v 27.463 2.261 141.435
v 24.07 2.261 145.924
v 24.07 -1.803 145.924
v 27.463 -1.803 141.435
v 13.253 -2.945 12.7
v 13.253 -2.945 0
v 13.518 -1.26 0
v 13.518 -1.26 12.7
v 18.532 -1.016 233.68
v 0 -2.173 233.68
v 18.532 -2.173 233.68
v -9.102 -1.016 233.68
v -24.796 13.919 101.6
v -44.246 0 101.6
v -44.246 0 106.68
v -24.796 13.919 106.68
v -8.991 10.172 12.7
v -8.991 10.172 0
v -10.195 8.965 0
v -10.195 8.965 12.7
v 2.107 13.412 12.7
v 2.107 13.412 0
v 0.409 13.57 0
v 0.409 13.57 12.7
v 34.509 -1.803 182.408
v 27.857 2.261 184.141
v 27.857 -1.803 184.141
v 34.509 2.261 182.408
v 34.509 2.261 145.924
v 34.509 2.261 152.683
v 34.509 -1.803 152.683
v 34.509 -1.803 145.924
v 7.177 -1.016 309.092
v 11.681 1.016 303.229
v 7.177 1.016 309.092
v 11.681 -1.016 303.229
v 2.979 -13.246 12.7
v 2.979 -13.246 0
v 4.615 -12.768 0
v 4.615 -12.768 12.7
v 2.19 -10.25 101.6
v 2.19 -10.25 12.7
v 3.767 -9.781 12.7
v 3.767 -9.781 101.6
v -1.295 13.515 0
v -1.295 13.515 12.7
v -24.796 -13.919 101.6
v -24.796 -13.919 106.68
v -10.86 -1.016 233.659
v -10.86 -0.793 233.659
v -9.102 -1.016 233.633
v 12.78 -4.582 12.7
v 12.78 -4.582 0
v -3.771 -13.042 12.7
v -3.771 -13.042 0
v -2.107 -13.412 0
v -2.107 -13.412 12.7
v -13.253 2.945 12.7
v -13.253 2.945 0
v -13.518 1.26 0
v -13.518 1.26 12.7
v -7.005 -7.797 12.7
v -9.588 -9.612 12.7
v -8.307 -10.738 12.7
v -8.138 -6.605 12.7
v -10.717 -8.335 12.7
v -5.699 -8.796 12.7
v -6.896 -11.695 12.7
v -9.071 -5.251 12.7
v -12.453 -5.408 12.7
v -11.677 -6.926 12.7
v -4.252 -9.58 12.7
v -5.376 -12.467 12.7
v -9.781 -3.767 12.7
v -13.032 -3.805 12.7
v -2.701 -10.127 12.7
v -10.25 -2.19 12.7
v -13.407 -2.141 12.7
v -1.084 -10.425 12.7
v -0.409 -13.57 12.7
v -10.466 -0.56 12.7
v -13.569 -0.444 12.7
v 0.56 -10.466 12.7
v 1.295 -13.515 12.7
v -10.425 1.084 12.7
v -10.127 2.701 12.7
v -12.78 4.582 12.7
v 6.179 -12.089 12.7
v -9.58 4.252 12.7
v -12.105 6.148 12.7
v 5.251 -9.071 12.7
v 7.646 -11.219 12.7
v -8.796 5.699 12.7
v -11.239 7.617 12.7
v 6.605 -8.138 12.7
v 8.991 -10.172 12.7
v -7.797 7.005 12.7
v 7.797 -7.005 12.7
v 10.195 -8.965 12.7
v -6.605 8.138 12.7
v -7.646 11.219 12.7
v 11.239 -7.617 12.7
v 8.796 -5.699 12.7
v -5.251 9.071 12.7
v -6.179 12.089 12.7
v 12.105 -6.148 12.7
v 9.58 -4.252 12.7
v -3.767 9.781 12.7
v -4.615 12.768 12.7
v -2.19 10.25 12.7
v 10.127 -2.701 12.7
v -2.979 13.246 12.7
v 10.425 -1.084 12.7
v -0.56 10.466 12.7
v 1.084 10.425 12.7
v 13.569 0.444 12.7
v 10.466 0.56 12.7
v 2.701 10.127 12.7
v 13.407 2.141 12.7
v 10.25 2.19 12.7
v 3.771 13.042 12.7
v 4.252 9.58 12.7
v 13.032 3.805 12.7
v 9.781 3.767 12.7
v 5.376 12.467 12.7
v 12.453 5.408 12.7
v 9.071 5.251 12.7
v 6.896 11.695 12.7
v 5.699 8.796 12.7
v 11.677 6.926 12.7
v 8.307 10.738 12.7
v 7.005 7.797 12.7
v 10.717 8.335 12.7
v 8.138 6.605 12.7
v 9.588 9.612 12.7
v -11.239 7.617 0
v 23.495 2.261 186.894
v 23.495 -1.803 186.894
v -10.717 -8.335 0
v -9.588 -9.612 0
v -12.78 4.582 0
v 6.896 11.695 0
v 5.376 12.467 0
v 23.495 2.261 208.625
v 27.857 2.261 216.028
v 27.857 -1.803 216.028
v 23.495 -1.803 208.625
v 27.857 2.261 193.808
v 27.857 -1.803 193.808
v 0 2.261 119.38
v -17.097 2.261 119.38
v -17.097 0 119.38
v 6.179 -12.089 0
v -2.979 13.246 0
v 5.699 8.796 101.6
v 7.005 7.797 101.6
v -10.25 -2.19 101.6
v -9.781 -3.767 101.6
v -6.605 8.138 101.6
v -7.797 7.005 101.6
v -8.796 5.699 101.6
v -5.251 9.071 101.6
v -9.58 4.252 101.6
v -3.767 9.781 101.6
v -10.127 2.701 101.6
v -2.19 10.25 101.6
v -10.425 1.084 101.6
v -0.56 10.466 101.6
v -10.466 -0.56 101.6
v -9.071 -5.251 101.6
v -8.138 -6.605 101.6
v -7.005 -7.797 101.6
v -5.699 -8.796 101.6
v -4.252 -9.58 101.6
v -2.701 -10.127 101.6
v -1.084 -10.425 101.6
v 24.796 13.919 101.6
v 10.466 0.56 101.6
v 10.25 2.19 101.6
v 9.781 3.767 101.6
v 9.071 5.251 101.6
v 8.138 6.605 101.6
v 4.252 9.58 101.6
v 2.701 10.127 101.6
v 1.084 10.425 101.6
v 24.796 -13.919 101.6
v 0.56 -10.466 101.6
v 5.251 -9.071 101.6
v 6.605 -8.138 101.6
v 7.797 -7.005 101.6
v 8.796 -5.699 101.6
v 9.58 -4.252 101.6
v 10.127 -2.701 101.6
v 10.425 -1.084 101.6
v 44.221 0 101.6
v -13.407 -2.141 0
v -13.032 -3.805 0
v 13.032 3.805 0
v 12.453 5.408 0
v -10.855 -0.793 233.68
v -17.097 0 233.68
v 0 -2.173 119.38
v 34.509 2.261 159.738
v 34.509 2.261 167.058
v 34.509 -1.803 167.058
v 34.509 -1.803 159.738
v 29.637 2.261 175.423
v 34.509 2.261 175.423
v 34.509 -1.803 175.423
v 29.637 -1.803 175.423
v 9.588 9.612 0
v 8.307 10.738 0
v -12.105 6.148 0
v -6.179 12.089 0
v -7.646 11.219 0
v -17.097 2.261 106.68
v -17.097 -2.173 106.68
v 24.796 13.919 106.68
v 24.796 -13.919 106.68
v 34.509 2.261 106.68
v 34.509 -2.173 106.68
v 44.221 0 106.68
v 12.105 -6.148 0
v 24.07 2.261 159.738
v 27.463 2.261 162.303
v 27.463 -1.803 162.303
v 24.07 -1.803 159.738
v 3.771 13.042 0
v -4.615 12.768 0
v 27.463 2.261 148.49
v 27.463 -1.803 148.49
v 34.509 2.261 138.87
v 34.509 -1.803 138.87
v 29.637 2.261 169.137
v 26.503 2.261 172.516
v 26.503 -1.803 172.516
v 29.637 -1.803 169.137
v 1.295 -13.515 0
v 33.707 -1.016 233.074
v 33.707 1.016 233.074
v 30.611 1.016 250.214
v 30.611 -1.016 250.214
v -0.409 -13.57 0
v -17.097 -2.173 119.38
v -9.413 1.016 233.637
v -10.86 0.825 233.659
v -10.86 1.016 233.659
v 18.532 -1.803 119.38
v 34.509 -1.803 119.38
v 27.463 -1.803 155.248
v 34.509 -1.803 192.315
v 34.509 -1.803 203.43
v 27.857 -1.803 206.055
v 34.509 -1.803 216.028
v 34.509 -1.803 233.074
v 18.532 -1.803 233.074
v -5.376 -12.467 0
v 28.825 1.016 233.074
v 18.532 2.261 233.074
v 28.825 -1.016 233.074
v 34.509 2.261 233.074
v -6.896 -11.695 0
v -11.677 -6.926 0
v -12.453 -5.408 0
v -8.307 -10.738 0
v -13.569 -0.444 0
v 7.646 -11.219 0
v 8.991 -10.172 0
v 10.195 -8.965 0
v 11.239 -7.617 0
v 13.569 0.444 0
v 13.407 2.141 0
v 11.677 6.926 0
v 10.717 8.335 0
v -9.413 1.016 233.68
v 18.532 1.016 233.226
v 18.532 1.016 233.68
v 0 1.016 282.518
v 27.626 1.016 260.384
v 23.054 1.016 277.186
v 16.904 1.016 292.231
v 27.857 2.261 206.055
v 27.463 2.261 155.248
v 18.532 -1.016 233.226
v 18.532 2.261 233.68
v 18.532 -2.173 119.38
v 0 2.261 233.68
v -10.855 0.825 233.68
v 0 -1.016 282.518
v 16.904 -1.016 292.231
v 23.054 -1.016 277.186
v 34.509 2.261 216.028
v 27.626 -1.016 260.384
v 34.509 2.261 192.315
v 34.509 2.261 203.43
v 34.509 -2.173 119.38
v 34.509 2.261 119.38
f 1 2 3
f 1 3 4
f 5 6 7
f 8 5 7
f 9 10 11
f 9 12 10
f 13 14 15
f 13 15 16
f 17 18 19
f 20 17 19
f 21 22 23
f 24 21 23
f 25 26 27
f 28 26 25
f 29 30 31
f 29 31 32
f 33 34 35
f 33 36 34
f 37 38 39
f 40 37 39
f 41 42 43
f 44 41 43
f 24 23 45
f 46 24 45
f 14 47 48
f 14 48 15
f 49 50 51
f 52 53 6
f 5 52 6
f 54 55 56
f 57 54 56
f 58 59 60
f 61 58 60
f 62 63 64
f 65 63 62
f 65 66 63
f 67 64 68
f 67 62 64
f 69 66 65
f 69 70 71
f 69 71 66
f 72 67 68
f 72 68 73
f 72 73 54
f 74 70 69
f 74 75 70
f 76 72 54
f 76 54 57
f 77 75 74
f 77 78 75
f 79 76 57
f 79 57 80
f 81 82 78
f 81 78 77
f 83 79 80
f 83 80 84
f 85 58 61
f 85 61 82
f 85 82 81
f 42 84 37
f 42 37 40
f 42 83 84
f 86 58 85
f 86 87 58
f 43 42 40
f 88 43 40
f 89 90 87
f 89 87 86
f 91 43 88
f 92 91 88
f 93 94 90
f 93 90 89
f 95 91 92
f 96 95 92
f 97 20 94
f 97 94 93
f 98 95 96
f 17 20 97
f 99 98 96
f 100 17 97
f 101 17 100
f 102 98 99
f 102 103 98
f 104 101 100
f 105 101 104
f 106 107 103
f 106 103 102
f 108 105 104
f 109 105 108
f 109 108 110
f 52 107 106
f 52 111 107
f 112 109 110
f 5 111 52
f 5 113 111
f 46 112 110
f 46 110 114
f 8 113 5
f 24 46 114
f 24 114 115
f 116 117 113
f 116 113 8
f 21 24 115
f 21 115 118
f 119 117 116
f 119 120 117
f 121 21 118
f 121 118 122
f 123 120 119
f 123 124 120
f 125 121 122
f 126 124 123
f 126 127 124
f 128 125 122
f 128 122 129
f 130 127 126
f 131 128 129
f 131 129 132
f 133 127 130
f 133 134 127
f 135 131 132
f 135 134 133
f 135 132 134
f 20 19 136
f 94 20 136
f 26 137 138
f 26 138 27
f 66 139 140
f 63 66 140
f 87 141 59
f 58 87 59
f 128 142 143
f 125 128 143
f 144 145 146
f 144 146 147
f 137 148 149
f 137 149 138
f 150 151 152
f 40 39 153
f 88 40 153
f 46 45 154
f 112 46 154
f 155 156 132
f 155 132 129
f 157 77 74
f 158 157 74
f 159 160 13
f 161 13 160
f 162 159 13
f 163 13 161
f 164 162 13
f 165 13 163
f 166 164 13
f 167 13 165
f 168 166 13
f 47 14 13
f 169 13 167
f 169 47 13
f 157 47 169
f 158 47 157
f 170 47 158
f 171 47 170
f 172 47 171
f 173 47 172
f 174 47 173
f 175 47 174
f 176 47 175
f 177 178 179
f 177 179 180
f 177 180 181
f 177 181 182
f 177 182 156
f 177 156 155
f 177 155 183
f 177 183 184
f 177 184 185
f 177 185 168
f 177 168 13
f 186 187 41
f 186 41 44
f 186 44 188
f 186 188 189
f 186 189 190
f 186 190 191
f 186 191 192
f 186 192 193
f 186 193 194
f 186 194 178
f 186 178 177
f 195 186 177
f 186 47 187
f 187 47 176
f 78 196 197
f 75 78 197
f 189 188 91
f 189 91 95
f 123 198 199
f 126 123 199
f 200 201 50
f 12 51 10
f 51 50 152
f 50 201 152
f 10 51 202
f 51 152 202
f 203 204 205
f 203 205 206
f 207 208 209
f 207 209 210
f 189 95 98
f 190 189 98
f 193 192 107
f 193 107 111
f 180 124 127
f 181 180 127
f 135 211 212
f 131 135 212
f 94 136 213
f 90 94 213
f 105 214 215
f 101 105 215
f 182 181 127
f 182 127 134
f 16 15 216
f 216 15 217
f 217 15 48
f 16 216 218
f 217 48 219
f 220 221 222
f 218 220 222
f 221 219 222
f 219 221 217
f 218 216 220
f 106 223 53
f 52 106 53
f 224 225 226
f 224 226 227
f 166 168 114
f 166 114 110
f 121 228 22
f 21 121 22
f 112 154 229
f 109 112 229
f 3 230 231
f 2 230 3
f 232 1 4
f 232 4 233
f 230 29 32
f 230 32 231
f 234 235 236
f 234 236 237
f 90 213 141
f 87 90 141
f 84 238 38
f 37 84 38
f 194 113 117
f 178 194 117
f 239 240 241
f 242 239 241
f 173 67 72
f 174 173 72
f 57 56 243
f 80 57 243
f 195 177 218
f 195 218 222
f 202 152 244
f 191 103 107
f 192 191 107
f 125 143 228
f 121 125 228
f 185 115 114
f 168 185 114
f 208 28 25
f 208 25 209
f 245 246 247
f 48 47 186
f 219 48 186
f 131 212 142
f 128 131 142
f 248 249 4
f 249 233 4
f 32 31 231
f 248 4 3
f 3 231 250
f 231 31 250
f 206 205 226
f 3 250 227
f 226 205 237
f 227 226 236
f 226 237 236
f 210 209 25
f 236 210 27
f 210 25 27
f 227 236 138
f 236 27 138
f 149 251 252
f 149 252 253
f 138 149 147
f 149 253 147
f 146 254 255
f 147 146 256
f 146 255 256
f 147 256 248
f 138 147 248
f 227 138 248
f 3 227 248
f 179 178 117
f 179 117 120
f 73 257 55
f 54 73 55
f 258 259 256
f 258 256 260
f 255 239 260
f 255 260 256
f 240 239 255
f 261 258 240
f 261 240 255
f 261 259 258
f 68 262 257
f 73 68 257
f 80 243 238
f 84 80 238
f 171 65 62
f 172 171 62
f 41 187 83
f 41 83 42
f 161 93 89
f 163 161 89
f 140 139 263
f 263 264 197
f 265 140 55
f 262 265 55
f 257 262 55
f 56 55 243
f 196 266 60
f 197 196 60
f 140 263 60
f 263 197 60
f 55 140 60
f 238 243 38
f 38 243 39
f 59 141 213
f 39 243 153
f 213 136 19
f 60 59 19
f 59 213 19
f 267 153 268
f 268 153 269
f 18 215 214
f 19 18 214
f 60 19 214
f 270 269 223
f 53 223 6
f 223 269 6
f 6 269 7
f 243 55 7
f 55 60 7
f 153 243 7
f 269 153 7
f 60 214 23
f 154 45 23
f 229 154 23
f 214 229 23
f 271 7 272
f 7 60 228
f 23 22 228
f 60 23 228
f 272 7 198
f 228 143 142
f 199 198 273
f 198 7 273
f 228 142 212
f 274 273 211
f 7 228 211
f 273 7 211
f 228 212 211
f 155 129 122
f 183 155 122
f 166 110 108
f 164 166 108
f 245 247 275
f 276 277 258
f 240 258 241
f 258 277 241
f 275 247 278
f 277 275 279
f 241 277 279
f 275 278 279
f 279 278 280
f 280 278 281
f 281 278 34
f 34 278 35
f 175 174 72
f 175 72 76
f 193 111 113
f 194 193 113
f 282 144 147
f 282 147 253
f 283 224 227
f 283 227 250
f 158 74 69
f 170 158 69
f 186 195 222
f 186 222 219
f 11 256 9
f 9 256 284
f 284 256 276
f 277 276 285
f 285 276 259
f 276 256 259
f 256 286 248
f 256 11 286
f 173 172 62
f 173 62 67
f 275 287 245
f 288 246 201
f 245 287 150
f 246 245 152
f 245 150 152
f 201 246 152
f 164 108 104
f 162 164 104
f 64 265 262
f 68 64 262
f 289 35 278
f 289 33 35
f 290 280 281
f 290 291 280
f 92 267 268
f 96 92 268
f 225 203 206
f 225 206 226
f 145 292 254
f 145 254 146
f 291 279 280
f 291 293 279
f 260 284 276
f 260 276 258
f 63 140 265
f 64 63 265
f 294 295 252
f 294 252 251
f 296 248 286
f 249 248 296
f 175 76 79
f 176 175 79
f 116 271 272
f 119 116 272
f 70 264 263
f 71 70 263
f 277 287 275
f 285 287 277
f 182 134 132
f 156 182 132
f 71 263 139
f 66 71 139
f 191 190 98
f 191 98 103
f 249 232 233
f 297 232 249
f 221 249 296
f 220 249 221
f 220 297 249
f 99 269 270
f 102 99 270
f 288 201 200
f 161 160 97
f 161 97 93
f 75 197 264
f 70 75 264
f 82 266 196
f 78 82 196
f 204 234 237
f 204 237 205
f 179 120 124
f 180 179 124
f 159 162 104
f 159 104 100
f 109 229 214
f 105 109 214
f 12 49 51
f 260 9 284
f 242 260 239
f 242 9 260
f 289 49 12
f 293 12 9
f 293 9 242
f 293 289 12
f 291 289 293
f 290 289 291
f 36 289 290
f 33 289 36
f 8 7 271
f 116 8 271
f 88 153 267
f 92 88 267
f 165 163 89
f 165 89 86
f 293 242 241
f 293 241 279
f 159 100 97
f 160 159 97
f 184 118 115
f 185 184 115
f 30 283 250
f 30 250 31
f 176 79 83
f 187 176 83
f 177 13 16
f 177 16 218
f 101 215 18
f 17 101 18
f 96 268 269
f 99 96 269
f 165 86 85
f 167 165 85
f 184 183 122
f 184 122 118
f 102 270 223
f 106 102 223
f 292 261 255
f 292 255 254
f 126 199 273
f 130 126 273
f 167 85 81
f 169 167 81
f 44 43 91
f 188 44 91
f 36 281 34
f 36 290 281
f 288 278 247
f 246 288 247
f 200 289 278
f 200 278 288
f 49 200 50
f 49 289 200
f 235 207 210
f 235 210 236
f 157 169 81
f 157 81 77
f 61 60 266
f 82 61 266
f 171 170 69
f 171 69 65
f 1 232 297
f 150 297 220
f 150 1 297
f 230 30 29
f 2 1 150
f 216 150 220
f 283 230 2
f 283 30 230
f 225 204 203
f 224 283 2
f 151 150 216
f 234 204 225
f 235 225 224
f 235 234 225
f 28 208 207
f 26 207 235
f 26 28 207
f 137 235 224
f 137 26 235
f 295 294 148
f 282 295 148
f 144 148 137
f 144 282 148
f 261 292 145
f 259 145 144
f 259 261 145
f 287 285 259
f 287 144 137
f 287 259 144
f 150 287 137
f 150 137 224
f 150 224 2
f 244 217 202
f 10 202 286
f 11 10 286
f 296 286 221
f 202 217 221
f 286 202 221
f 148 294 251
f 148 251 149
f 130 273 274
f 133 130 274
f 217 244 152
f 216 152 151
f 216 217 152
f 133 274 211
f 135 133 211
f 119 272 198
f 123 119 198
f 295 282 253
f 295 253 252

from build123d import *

# Parameters (mm, degrees)
F1_DEPTH  = 12.7
F3_DEPTH  = 88.9
F4_W      = 49.5914556086
F4_H      = 27.8375800699
F5_DEPTH  = 5.08
F7_DEPTH  = 5.08
F8_DEPTH  = 5.08
F9_W      = 51.6053037718
F9_H      = 4.4333104743
F10_DEPTH = 12.7
F11_W     = 18.5319427401
F11_H     = 4.4333104743
F12_DEPTH = 114.3
F14_DEPTH = 114.3
F16_DEPTH = 4.064
F18_DEPTH = 1.016
F19_DEPTH = 1.016


# Not quite as in the source:
# - a length typed as a fraction of an inch, garbled in the dataset ("3 / 203.2 mm" for 3/8 in), is restored


with BuildPart() as f1:
    # F0 (on Top) → F1 (new body)
    with BuildSketch(Plane.XY):
        Polygon((7.6455804064, -11.218967169), (8.9914021538, -10.1722569471), (10.195424118, -8.9651241566), (11.2386581535, -7.6166060026), (12.1046518362, -6.147969422), (12.7797479285, -4.582375691), (13.2532997617, -2.9445151579), (13.5178391405, -1.2602178619), (13.569194121, 0.4439538226), (13.4065548043, 2.1411240902), (13.0324861096, 3.8045275518), (12.4528873238, 5.4079313412), (11.6768990658, 6.9260488228), (10.7167591342, 8.334938377), (9.5876095091, 9.612380974), (8.3072575547, 10.7382305809), (6.8958951862, 11.6947318768), (5.3757804312, 12.4668002649), (3.7708864074, 13.0422597655), (2.1065232524, 13.4120350386), (0.4089389673, 13.5702945071), (-1.2950945296, 13.5145423248), (-2.9787036121, 13.2456577368), (-4.6153367593, 12.7678812137), (-6.1791832887, 12.0887475767), (-7.6455804064, 11.218967169), (-8.9914021538, 10.1722569471), (-10.195424118, 8.9651241566), (-11.2386581535, 7.6166060026), (-12.1046518362, 6.147969422), (-12.7797479285, 4.582375691), (-13.2532997617, 2.9445151579), (-13.5178391405, 1.2602178619), (-13.569194121, -0.4439538226), (-13.4065548043, -2.1411240902), (-13.0324861096, -3.8045275518), (-12.4528873238, -5.4079313412), (-11.6768990658, -6.9260488228), (-10.7167591342, -8.334938377), (-9.5876095091, -9.612380974), (-8.3072575547, -10.7382305809), (-6.8958951862, -11.6947318768), (-5.3757804312, -12.4668002649), (-3.7708864074, -13.0422597655), (-2.1065232524, -13.4120350386), (-0.4089389673, -13.5702945071), (1.2950945296, -13.5145423248), (2.9787036121, -13.2456577368), (4.6153367593, -12.7678812137), (6.1791832887, -12.0887475767), align=None)
    extrude(amount=F1_DEPTH)

    # F2 (on face) → F3 (join)
    with BuildSketch(Plane.XY.offset(12.7)):
        Polygon((2.1904929984, -10.2495944917), (3.7669142259, -9.7807363749), (5.2505815234, -9.0710440681), (6.6049620782, -8.1379925514), (7.796706546, -7.0045566495), (8.7964702228, -5.6986453162), (9.5796356089, -4.2524144224), (10.1269185734, -2.7014749726), (10.4248431933, -1.0840162433), (10.4660735757, 0.5601345635), (10.2495944917, 2.1904929984), (9.7807363749, 3.7669142259), (9.0710440681, 5.2505815234), (8.1379925514, 6.6049620782), (7.0045566495, 7.796706546), (5.6986453162, 8.7964702228), (4.2524144224, 9.5796356089), (2.7014749726, 10.1269185734), (1.0840162433, 10.4248431933), (-0.5601345635, 10.4660735757), (-2.1904929984, 10.2495944917), (-3.7669142259, 9.7807363749), (-5.2505815234, 9.0710440681), (-6.6049620782, 8.1379925514), (-7.796706546, 7.0045566495), (-8.7964702228, 5.6986453162), (-9.5796356089, 4.2524144224), (-10.1269185734, 2.7014749726), (-10.4248431933, 1.0840162433), (-10.4660735757, -0.5601345635), (-10.2495944917, -2.1904929984), (-9.7807363749, -3.7669142259), (-9.0710440681, -5.2505815234), (-8.1379925514, -6.6049620782), (-7.0045566495, -7.796706546), (-5.6986453162, -8.7964702228), (-4.2524144224, -9.5796356089), (-2.7014749726, -10.1269185734), (-1.0840162433, -10.4248431933), (0.5601345635, -10.4660735757), align=None)
    extrude(amount=F3_DEPTH)

    # F4 (on face) → F5 (join)
    with BuildSketch(Plane.XY.offset(101.6)):
        Rectangle(F4_W, F4_H)
    extrude(amount=F5_DEPTH)

    # F6 (on face) → F7 (join)
    with BuildSketch(Plane(origin=(0, 0, 101.6), x_dir=(1, 0, 0), z_dir=(0, 0, -1))):
        Polygon((-44.2462861538, 0), (-24.7957278043, -13.9187900349), (-24.7957278043, 13.9187900349), align=None)
    extrude(amount=-F7_DEPTH)

    # F6 (on face) → F8 (join)
    with BuildSketch(Plane(origin=(0, 0, 101.6), x_dir=(1, 0, 0), z_dir=(0, 0, -1))):
        Polygon((24.7957278043, 13.9187900349), (24.7957278043, -13.9187900349), (44.2214161158, 0), align=None)
    extrude(amount=-F8_DEPTH)

    # F9 (on face) → F10 (join)
    with BuildSketch(Plane.XY.offset(106.68)):
        with Locations((8.7059200741, 0.0440463773)):
            Rectangle(F9_W, F9_H)
    extrude(amount=F10_DEPTH)

    # F11 (on face) → F12 (join)
    with BuildSketch(Plane.XY.offset(119.38)):
        with Locations((9.26597137, 0.0440463773)):
            Rectangle(F11_W, F11_H)
    extrude(amount=F12_DEPTH)

    # F13 (on face) → F14 (join)
    with BuildSketch(Plane.XY.offset(119.38)):
        Polygon((0, -2.1726088598), (0, 2.2607016144), (-17.0967318118, 0), align=None)
    extrude(amount=F14_DEPTH)

    # F15 (on face) → F16 (join)
    with BuildSketch(Plane(origin=(0, 2.2607016144, 0), x_dir=(-1, 0, 0), z_dir=(0, 1, 0))):
        Polygon((-34.50857196, 124.4318857789), (-34.50857196, 119.38), (-18.5319427401, 119.38), (-18.5319427401, 233.0740690231), (-34.50857196, 233.0740690231), (-34.50857196, 216.0275018554), (-27.85702236, 216.0275018554), (-23.4947055578, 208.6254060268), (-27.85702236, 206.0545384884), (-34.50857196, 203.4297866207), (-34.50857196, 192.3147596109), (-27.85702236, 193.8075326945), (-23.4947055578, 186.8935078382), (-27.85702236, 184.1411590576), (-34.50857196, 182.4075117771), (-34.50857196, 175.4231682831), (-29.6370955184, 175.4231682831), (-26.5028076246, 172.5162565708), (-29.6370955184, 169.1368073225), (-34.50857196, 167.0584704934), (-34.50857196, 159.7376912832), (-27.4633802474, 162.3028325299), (-24.0699224556, 159.7376912832), (-27.4633802474, 155.2484430598), (-34.50857196, 152.6833018131), (-34.50857196, 145.9243744612), (-27.4633802474, 148.4895157079), (-24.0699224556, 145.9243744612), (-27.4633802474, 141.4351262377), (-34.50857196, 138.869984991), (-34.50857196, 131.7707747221), align=None)
    extrude(amount=-F16_DEPTH)

    # F17 (on Front) → F18 (join)
    with BuildSketch(Plane.XZ):
        Polygon((-10.8600538224, 233.6585074663), (33.719830215, 233.0019772053), (30.6109376252, 250.2144873142), (27.6256743819, 260.3836655617), (23.0536255985, 277.1858274937), (16.9042795897, 292.2313511372), (11.6809960455, 303.2293915749), (7.1772807278, 309.0918958187), (0, 282.517939806), align=None)
    extrude(amount=F18_DEPTH)

    # F17 (on Front) → F19 (join)
    with BuildSketch(Plane.XZ):
        Polygon((-10.8600538224, 233.6585074663), (33.719830215, 233.0019772053), (30.6109376252, 250.2144873142), (27.6256743819, 260.3836655617), (23.0536255985, 277.1858274937), (16.9042795897, 292.2313511372), (11.6809960455, 303.2293915749), (7.1772807278, 309.0918958187), (0, 282.517939806), align=None)
    extrude(amount=-F19_DEPTH)


solid = f1.part
